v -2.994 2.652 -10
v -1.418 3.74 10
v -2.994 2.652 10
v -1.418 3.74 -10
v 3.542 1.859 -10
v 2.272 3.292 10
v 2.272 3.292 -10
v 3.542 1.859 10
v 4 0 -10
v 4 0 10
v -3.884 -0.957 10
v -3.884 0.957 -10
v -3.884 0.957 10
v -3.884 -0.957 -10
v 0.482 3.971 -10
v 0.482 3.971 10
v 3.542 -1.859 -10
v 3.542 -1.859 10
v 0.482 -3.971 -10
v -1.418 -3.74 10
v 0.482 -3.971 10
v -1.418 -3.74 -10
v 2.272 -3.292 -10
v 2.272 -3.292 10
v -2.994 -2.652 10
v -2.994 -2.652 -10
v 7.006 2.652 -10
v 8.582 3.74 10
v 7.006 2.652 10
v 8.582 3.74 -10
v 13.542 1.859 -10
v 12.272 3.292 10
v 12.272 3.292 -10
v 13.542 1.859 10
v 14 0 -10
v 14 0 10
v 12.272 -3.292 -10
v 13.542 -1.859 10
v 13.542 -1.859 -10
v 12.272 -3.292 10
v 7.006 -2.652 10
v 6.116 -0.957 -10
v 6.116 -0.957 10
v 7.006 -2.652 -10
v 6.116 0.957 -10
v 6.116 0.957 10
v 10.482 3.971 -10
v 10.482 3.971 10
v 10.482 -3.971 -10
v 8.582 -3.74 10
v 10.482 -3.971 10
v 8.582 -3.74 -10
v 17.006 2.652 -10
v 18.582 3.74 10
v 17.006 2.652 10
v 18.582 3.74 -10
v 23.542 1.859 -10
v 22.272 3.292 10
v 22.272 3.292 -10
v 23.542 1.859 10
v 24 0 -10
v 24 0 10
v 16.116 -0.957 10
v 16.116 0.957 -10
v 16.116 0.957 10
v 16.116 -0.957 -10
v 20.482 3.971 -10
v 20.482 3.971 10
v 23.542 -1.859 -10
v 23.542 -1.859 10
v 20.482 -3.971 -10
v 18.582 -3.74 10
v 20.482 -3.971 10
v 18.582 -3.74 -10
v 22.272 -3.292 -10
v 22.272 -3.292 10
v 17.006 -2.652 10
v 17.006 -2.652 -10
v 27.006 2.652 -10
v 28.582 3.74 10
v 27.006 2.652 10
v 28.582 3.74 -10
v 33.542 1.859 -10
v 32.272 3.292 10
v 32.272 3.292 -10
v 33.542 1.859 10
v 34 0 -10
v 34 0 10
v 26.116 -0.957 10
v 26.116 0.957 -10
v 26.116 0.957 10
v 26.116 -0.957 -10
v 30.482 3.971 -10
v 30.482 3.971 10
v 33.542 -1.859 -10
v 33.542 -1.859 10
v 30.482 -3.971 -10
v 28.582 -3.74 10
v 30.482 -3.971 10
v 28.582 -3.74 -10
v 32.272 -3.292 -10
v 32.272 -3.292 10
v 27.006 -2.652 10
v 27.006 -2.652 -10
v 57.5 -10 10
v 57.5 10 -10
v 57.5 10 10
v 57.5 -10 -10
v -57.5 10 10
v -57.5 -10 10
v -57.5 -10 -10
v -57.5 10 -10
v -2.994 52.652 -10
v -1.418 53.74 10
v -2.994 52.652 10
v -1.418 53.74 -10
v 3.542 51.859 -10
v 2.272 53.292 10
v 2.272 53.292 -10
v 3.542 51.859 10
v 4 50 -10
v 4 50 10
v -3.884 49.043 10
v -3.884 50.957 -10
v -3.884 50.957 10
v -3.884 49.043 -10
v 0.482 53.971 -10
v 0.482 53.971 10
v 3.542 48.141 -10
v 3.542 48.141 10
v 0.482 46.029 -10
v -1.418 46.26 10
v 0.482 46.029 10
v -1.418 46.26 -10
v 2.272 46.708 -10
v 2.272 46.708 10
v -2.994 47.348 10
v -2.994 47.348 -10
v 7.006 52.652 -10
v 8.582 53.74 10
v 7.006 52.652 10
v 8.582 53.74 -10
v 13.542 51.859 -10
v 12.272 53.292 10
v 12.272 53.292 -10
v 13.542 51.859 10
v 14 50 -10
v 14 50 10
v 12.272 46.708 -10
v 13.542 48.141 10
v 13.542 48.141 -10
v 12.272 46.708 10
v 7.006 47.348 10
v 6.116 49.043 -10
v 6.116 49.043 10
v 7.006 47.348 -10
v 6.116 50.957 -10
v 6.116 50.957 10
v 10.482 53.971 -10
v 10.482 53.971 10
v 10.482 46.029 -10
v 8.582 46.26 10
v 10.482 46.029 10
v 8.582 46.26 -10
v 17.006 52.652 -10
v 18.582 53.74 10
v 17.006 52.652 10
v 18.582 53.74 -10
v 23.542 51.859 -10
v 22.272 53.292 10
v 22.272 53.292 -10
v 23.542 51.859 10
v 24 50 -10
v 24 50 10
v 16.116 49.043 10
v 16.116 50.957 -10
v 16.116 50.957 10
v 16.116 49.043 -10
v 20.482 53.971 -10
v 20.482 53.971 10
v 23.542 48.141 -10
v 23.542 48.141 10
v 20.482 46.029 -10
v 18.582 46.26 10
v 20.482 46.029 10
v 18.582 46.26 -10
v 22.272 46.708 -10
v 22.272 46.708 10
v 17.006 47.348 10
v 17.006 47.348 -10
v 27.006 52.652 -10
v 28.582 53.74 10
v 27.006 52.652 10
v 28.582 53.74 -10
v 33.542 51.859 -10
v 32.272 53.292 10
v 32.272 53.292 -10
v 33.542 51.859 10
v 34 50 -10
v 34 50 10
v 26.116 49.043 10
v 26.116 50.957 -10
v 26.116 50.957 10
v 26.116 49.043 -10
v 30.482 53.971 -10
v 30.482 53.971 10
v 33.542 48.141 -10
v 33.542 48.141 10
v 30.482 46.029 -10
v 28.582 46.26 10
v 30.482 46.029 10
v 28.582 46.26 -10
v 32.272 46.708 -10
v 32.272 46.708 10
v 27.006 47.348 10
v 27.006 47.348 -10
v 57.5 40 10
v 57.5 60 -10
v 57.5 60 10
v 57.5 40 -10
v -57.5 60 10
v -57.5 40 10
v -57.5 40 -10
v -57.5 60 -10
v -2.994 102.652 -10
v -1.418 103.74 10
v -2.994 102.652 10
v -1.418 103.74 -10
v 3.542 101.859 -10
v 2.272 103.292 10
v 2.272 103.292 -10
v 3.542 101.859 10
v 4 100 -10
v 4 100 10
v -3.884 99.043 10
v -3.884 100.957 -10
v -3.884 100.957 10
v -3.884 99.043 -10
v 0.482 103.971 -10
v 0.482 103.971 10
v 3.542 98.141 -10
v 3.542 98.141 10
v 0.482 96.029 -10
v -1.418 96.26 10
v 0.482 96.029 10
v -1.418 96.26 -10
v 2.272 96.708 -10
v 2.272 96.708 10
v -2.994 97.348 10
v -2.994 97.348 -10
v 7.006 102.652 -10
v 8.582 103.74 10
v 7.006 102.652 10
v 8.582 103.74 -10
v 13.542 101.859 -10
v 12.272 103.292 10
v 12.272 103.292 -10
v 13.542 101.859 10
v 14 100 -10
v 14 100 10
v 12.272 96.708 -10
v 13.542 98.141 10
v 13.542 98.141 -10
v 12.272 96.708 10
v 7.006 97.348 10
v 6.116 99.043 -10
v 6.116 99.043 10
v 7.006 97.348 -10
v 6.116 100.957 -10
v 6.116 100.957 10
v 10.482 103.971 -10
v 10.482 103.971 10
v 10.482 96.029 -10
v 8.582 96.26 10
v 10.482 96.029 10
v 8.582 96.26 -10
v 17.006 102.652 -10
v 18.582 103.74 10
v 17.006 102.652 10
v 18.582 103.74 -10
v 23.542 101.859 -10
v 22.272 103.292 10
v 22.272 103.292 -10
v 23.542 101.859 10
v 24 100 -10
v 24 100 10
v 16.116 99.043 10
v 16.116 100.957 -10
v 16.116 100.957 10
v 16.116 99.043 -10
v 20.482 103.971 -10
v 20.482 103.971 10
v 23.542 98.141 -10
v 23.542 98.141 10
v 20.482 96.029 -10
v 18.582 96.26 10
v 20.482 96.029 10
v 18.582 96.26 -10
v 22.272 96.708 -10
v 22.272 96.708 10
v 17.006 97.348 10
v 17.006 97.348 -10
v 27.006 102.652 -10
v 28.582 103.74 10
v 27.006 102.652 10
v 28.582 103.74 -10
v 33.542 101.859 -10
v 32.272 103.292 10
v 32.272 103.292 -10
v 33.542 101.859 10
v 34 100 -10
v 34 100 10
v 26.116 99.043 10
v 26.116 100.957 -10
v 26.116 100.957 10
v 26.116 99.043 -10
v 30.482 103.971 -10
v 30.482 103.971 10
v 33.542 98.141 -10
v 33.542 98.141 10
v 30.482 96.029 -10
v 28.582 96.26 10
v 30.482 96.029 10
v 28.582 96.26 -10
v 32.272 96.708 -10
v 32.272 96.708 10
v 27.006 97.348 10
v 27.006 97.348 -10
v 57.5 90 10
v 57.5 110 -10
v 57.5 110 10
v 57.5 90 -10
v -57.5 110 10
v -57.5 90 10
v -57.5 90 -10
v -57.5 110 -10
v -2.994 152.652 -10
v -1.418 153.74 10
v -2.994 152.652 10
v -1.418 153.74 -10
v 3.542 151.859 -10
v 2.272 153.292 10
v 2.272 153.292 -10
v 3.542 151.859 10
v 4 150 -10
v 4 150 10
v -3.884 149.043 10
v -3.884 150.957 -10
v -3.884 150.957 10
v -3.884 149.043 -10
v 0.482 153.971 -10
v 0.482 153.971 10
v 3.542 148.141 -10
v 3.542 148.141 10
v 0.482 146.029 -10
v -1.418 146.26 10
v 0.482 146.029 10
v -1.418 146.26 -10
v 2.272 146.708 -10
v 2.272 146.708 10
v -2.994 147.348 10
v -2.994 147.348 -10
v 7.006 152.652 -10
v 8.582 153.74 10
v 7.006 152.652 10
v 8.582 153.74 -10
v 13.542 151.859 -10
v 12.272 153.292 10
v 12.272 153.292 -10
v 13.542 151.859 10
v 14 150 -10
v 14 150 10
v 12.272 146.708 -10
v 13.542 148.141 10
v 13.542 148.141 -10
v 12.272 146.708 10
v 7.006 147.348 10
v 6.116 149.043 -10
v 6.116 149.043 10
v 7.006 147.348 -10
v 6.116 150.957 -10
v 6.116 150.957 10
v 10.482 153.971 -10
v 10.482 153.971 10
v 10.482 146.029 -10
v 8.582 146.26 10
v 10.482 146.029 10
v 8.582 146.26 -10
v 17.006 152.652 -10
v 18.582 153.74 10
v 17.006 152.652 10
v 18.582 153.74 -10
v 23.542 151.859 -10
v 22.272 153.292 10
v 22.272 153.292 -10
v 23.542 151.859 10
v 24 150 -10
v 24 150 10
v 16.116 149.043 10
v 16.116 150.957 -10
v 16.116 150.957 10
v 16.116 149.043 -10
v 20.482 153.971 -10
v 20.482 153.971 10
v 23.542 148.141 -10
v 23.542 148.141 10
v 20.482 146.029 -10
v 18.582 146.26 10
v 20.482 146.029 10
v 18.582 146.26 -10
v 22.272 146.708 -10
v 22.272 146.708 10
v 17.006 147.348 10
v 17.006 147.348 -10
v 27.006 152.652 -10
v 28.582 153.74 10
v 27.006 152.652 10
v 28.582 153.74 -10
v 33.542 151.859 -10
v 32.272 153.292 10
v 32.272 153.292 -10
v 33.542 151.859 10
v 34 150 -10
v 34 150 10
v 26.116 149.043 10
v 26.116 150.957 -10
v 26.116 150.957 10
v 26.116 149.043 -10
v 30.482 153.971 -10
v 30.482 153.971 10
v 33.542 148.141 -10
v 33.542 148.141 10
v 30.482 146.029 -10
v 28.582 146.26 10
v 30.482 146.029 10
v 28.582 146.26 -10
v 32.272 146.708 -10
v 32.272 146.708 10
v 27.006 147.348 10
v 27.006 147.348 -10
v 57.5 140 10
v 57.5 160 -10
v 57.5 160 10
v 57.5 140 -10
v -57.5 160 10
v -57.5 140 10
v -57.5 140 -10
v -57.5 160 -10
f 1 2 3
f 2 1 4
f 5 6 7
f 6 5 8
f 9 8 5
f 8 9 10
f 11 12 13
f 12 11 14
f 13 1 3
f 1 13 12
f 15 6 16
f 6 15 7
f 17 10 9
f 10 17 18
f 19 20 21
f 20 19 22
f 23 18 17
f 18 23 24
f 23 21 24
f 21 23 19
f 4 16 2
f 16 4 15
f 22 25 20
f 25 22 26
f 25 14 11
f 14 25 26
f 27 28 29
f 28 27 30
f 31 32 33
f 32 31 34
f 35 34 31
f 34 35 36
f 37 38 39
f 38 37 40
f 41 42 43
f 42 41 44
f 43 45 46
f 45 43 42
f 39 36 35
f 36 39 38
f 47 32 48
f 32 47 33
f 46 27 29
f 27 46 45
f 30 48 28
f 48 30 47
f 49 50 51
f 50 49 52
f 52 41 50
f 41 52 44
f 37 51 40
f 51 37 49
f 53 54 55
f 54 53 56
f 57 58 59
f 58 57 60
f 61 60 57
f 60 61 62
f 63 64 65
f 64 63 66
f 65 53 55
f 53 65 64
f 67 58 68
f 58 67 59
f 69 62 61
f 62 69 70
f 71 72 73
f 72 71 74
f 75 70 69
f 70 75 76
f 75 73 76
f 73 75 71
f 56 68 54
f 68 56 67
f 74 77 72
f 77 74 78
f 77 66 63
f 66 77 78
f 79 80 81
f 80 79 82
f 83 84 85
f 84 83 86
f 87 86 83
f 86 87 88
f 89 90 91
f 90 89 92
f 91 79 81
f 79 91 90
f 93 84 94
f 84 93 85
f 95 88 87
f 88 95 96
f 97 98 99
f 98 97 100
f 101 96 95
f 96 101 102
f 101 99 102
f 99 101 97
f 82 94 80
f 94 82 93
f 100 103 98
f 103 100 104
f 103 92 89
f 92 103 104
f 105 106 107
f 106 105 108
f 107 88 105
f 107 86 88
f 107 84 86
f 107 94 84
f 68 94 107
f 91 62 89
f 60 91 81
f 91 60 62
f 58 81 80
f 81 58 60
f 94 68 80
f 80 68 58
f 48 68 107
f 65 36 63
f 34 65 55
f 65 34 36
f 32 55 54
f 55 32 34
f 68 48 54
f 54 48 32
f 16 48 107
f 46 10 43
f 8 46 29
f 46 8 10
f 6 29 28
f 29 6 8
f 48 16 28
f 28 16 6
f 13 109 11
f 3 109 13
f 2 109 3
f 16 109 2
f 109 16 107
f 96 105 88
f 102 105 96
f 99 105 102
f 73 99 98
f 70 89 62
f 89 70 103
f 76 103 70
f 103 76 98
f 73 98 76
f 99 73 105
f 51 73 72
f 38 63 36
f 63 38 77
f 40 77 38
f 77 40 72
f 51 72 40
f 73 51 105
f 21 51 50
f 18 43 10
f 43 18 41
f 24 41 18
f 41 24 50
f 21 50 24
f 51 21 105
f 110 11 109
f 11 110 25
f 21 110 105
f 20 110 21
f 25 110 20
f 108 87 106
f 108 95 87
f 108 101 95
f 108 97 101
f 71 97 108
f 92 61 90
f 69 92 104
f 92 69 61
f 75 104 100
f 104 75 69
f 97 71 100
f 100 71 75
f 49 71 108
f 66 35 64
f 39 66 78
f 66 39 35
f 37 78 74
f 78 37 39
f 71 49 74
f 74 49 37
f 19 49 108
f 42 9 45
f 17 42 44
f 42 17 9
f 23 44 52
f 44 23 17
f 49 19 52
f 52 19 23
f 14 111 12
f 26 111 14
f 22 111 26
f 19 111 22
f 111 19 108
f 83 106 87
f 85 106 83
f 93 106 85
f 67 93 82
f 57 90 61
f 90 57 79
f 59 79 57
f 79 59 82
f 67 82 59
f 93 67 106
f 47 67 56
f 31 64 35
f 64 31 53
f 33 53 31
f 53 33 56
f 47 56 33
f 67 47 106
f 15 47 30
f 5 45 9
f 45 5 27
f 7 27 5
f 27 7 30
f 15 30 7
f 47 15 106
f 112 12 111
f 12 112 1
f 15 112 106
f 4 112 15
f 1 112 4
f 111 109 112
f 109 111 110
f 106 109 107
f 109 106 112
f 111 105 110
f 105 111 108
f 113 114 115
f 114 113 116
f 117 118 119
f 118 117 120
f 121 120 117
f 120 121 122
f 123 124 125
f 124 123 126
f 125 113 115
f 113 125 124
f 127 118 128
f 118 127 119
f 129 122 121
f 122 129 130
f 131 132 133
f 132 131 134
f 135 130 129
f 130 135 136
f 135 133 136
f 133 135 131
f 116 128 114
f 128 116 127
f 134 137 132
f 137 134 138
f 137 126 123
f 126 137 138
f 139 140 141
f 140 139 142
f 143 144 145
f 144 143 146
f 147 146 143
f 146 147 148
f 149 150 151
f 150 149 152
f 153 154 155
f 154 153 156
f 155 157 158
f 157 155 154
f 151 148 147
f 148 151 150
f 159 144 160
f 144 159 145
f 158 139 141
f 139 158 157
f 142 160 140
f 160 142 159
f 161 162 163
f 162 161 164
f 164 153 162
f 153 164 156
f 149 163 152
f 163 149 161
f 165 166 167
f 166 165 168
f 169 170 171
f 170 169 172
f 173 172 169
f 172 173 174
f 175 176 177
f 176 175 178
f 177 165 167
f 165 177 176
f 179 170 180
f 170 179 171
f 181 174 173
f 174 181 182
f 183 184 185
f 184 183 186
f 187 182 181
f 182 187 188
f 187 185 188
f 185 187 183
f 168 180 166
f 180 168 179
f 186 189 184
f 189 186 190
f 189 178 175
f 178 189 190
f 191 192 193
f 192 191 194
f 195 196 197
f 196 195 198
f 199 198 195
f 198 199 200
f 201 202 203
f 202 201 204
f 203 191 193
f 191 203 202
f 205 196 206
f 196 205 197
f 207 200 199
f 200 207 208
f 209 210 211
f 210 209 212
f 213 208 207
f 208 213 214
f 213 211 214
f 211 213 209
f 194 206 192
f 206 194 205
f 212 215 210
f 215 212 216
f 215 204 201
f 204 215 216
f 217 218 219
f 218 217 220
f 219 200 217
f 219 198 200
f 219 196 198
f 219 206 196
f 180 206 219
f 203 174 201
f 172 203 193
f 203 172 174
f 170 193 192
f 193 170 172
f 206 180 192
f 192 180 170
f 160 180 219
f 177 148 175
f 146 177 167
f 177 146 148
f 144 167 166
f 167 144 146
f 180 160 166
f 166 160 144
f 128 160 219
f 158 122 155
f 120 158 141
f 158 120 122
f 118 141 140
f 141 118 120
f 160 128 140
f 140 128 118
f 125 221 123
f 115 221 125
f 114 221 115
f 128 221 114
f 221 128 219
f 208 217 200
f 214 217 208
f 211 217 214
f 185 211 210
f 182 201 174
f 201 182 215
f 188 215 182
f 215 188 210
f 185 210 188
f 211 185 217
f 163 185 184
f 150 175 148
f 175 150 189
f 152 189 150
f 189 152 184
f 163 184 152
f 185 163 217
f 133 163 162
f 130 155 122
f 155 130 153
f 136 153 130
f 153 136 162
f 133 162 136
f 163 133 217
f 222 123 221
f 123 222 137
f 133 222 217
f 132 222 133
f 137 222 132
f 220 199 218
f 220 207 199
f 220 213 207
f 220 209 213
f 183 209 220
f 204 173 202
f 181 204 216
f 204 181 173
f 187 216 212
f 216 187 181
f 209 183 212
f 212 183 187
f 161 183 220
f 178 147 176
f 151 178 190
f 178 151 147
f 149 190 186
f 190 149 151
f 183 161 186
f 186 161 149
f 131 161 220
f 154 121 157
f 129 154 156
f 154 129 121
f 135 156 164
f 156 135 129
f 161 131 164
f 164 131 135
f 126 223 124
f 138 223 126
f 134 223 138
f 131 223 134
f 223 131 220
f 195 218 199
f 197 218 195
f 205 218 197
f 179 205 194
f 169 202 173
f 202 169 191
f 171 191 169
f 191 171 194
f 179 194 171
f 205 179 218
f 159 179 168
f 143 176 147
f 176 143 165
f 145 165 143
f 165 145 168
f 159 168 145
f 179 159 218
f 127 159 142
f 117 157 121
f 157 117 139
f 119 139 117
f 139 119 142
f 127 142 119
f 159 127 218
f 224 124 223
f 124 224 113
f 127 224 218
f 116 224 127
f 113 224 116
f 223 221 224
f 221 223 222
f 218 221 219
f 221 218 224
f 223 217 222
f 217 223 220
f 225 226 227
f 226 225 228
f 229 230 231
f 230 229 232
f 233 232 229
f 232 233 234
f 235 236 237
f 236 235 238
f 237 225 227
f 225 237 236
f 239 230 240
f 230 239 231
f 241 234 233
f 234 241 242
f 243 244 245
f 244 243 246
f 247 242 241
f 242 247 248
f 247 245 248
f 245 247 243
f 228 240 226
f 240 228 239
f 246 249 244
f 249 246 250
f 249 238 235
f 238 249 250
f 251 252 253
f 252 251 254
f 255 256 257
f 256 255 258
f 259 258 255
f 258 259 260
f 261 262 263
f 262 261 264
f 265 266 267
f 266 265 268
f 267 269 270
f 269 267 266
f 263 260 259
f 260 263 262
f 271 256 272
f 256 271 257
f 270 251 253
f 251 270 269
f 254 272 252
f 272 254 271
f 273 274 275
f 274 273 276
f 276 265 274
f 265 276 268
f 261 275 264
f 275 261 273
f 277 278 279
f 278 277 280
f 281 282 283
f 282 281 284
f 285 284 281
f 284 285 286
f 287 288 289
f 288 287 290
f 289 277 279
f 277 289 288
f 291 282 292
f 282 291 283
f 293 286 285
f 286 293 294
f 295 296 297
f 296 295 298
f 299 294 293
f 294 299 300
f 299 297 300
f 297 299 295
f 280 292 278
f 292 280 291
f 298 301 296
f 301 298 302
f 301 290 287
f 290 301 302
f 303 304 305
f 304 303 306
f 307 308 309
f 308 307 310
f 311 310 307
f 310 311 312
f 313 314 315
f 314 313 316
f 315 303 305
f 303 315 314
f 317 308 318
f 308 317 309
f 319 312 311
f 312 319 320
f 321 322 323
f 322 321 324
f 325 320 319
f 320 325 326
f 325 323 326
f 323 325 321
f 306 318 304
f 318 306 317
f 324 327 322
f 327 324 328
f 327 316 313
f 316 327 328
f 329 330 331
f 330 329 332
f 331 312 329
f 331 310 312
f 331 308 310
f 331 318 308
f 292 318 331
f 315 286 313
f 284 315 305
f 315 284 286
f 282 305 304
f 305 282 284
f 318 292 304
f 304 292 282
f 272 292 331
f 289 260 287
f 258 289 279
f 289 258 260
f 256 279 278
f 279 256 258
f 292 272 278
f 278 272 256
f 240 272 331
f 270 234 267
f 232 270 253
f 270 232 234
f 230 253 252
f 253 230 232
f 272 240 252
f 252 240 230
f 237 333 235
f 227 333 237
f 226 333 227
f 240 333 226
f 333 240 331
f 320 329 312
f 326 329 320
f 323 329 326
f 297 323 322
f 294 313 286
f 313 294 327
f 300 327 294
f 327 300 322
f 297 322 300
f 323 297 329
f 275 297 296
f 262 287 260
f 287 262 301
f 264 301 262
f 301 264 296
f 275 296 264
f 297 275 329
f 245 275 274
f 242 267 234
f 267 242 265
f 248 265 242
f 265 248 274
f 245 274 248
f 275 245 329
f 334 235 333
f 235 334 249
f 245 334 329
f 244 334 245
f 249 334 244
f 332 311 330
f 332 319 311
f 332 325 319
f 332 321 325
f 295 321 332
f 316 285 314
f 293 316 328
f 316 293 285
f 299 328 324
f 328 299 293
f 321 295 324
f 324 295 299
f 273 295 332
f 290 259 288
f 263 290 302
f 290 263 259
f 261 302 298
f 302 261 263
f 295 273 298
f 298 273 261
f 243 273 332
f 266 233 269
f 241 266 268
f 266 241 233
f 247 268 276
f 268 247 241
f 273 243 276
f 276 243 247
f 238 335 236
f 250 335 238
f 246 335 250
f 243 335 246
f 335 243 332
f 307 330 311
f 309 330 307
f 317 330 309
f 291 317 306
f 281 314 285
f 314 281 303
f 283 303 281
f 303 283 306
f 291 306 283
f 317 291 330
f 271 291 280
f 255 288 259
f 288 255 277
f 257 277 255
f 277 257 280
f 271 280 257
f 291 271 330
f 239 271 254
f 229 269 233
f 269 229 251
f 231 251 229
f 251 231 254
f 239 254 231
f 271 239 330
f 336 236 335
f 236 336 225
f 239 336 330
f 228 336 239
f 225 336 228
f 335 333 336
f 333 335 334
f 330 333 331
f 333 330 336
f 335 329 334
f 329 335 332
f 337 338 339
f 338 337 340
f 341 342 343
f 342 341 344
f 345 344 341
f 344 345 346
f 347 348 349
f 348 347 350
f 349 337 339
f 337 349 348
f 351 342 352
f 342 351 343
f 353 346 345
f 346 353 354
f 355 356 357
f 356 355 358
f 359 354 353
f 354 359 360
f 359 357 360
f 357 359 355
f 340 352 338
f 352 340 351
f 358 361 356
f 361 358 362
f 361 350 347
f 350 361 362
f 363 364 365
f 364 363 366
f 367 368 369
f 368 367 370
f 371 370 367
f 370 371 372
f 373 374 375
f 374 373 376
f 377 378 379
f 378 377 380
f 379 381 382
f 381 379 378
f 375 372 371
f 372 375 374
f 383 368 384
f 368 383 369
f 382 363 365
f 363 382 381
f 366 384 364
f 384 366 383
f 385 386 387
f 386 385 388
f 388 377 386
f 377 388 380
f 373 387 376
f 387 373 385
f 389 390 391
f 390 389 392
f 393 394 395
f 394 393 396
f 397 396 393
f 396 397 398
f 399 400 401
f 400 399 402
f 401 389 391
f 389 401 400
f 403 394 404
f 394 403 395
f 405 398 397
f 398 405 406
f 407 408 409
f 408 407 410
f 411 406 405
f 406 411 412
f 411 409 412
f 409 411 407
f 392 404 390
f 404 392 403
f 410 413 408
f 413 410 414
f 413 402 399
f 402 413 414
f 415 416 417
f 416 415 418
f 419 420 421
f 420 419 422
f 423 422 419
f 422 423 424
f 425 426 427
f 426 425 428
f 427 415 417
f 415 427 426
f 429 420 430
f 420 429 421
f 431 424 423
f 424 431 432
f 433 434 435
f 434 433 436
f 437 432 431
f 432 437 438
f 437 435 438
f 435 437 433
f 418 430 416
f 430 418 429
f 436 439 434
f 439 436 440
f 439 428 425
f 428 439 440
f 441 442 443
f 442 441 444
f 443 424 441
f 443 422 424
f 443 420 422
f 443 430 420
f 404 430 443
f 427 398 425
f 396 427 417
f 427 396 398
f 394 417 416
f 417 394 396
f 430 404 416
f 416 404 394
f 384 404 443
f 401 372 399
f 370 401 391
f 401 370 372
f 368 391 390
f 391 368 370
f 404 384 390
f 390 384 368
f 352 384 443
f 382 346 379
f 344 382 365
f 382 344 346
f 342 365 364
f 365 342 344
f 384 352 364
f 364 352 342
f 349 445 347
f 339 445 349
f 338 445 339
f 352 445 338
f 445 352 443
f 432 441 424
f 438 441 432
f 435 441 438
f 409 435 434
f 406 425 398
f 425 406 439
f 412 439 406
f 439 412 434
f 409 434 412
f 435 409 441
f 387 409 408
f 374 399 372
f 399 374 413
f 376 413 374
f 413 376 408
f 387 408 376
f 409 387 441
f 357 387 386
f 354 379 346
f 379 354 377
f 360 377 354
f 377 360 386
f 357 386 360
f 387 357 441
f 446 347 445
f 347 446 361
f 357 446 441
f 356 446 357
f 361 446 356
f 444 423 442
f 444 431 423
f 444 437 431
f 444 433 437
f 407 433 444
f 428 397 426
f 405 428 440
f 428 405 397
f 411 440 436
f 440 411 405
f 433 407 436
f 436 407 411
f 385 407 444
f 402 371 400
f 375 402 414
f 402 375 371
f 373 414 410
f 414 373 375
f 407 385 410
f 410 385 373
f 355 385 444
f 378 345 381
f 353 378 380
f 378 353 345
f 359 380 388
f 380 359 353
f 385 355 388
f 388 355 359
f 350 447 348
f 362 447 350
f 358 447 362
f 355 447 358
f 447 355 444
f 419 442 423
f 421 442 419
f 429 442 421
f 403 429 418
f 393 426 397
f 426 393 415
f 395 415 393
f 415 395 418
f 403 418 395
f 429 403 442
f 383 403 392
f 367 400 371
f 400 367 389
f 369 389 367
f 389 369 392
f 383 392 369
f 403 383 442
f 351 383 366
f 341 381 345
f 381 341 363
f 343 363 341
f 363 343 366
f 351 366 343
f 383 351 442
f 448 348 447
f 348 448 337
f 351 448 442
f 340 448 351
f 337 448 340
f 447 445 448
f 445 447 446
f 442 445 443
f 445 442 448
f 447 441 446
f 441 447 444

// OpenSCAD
// Generated by OpenSCAD Visual Editor Prototype
// UI -> OpenSCAD code

module scene_model() {
    for (i = [0 : 1 : 3]) {
        translate([0, i*50, 0]) {
            difference() {
                cube([115, 20, 20], center=true);
                for (i = [0 : 1 : 3]) {
                    translate([i*10, 0, 0]) {
                        cylinder(h=30, r=4, center=true);
                    }
                }
            }
        }
    }
}

scene_model();
